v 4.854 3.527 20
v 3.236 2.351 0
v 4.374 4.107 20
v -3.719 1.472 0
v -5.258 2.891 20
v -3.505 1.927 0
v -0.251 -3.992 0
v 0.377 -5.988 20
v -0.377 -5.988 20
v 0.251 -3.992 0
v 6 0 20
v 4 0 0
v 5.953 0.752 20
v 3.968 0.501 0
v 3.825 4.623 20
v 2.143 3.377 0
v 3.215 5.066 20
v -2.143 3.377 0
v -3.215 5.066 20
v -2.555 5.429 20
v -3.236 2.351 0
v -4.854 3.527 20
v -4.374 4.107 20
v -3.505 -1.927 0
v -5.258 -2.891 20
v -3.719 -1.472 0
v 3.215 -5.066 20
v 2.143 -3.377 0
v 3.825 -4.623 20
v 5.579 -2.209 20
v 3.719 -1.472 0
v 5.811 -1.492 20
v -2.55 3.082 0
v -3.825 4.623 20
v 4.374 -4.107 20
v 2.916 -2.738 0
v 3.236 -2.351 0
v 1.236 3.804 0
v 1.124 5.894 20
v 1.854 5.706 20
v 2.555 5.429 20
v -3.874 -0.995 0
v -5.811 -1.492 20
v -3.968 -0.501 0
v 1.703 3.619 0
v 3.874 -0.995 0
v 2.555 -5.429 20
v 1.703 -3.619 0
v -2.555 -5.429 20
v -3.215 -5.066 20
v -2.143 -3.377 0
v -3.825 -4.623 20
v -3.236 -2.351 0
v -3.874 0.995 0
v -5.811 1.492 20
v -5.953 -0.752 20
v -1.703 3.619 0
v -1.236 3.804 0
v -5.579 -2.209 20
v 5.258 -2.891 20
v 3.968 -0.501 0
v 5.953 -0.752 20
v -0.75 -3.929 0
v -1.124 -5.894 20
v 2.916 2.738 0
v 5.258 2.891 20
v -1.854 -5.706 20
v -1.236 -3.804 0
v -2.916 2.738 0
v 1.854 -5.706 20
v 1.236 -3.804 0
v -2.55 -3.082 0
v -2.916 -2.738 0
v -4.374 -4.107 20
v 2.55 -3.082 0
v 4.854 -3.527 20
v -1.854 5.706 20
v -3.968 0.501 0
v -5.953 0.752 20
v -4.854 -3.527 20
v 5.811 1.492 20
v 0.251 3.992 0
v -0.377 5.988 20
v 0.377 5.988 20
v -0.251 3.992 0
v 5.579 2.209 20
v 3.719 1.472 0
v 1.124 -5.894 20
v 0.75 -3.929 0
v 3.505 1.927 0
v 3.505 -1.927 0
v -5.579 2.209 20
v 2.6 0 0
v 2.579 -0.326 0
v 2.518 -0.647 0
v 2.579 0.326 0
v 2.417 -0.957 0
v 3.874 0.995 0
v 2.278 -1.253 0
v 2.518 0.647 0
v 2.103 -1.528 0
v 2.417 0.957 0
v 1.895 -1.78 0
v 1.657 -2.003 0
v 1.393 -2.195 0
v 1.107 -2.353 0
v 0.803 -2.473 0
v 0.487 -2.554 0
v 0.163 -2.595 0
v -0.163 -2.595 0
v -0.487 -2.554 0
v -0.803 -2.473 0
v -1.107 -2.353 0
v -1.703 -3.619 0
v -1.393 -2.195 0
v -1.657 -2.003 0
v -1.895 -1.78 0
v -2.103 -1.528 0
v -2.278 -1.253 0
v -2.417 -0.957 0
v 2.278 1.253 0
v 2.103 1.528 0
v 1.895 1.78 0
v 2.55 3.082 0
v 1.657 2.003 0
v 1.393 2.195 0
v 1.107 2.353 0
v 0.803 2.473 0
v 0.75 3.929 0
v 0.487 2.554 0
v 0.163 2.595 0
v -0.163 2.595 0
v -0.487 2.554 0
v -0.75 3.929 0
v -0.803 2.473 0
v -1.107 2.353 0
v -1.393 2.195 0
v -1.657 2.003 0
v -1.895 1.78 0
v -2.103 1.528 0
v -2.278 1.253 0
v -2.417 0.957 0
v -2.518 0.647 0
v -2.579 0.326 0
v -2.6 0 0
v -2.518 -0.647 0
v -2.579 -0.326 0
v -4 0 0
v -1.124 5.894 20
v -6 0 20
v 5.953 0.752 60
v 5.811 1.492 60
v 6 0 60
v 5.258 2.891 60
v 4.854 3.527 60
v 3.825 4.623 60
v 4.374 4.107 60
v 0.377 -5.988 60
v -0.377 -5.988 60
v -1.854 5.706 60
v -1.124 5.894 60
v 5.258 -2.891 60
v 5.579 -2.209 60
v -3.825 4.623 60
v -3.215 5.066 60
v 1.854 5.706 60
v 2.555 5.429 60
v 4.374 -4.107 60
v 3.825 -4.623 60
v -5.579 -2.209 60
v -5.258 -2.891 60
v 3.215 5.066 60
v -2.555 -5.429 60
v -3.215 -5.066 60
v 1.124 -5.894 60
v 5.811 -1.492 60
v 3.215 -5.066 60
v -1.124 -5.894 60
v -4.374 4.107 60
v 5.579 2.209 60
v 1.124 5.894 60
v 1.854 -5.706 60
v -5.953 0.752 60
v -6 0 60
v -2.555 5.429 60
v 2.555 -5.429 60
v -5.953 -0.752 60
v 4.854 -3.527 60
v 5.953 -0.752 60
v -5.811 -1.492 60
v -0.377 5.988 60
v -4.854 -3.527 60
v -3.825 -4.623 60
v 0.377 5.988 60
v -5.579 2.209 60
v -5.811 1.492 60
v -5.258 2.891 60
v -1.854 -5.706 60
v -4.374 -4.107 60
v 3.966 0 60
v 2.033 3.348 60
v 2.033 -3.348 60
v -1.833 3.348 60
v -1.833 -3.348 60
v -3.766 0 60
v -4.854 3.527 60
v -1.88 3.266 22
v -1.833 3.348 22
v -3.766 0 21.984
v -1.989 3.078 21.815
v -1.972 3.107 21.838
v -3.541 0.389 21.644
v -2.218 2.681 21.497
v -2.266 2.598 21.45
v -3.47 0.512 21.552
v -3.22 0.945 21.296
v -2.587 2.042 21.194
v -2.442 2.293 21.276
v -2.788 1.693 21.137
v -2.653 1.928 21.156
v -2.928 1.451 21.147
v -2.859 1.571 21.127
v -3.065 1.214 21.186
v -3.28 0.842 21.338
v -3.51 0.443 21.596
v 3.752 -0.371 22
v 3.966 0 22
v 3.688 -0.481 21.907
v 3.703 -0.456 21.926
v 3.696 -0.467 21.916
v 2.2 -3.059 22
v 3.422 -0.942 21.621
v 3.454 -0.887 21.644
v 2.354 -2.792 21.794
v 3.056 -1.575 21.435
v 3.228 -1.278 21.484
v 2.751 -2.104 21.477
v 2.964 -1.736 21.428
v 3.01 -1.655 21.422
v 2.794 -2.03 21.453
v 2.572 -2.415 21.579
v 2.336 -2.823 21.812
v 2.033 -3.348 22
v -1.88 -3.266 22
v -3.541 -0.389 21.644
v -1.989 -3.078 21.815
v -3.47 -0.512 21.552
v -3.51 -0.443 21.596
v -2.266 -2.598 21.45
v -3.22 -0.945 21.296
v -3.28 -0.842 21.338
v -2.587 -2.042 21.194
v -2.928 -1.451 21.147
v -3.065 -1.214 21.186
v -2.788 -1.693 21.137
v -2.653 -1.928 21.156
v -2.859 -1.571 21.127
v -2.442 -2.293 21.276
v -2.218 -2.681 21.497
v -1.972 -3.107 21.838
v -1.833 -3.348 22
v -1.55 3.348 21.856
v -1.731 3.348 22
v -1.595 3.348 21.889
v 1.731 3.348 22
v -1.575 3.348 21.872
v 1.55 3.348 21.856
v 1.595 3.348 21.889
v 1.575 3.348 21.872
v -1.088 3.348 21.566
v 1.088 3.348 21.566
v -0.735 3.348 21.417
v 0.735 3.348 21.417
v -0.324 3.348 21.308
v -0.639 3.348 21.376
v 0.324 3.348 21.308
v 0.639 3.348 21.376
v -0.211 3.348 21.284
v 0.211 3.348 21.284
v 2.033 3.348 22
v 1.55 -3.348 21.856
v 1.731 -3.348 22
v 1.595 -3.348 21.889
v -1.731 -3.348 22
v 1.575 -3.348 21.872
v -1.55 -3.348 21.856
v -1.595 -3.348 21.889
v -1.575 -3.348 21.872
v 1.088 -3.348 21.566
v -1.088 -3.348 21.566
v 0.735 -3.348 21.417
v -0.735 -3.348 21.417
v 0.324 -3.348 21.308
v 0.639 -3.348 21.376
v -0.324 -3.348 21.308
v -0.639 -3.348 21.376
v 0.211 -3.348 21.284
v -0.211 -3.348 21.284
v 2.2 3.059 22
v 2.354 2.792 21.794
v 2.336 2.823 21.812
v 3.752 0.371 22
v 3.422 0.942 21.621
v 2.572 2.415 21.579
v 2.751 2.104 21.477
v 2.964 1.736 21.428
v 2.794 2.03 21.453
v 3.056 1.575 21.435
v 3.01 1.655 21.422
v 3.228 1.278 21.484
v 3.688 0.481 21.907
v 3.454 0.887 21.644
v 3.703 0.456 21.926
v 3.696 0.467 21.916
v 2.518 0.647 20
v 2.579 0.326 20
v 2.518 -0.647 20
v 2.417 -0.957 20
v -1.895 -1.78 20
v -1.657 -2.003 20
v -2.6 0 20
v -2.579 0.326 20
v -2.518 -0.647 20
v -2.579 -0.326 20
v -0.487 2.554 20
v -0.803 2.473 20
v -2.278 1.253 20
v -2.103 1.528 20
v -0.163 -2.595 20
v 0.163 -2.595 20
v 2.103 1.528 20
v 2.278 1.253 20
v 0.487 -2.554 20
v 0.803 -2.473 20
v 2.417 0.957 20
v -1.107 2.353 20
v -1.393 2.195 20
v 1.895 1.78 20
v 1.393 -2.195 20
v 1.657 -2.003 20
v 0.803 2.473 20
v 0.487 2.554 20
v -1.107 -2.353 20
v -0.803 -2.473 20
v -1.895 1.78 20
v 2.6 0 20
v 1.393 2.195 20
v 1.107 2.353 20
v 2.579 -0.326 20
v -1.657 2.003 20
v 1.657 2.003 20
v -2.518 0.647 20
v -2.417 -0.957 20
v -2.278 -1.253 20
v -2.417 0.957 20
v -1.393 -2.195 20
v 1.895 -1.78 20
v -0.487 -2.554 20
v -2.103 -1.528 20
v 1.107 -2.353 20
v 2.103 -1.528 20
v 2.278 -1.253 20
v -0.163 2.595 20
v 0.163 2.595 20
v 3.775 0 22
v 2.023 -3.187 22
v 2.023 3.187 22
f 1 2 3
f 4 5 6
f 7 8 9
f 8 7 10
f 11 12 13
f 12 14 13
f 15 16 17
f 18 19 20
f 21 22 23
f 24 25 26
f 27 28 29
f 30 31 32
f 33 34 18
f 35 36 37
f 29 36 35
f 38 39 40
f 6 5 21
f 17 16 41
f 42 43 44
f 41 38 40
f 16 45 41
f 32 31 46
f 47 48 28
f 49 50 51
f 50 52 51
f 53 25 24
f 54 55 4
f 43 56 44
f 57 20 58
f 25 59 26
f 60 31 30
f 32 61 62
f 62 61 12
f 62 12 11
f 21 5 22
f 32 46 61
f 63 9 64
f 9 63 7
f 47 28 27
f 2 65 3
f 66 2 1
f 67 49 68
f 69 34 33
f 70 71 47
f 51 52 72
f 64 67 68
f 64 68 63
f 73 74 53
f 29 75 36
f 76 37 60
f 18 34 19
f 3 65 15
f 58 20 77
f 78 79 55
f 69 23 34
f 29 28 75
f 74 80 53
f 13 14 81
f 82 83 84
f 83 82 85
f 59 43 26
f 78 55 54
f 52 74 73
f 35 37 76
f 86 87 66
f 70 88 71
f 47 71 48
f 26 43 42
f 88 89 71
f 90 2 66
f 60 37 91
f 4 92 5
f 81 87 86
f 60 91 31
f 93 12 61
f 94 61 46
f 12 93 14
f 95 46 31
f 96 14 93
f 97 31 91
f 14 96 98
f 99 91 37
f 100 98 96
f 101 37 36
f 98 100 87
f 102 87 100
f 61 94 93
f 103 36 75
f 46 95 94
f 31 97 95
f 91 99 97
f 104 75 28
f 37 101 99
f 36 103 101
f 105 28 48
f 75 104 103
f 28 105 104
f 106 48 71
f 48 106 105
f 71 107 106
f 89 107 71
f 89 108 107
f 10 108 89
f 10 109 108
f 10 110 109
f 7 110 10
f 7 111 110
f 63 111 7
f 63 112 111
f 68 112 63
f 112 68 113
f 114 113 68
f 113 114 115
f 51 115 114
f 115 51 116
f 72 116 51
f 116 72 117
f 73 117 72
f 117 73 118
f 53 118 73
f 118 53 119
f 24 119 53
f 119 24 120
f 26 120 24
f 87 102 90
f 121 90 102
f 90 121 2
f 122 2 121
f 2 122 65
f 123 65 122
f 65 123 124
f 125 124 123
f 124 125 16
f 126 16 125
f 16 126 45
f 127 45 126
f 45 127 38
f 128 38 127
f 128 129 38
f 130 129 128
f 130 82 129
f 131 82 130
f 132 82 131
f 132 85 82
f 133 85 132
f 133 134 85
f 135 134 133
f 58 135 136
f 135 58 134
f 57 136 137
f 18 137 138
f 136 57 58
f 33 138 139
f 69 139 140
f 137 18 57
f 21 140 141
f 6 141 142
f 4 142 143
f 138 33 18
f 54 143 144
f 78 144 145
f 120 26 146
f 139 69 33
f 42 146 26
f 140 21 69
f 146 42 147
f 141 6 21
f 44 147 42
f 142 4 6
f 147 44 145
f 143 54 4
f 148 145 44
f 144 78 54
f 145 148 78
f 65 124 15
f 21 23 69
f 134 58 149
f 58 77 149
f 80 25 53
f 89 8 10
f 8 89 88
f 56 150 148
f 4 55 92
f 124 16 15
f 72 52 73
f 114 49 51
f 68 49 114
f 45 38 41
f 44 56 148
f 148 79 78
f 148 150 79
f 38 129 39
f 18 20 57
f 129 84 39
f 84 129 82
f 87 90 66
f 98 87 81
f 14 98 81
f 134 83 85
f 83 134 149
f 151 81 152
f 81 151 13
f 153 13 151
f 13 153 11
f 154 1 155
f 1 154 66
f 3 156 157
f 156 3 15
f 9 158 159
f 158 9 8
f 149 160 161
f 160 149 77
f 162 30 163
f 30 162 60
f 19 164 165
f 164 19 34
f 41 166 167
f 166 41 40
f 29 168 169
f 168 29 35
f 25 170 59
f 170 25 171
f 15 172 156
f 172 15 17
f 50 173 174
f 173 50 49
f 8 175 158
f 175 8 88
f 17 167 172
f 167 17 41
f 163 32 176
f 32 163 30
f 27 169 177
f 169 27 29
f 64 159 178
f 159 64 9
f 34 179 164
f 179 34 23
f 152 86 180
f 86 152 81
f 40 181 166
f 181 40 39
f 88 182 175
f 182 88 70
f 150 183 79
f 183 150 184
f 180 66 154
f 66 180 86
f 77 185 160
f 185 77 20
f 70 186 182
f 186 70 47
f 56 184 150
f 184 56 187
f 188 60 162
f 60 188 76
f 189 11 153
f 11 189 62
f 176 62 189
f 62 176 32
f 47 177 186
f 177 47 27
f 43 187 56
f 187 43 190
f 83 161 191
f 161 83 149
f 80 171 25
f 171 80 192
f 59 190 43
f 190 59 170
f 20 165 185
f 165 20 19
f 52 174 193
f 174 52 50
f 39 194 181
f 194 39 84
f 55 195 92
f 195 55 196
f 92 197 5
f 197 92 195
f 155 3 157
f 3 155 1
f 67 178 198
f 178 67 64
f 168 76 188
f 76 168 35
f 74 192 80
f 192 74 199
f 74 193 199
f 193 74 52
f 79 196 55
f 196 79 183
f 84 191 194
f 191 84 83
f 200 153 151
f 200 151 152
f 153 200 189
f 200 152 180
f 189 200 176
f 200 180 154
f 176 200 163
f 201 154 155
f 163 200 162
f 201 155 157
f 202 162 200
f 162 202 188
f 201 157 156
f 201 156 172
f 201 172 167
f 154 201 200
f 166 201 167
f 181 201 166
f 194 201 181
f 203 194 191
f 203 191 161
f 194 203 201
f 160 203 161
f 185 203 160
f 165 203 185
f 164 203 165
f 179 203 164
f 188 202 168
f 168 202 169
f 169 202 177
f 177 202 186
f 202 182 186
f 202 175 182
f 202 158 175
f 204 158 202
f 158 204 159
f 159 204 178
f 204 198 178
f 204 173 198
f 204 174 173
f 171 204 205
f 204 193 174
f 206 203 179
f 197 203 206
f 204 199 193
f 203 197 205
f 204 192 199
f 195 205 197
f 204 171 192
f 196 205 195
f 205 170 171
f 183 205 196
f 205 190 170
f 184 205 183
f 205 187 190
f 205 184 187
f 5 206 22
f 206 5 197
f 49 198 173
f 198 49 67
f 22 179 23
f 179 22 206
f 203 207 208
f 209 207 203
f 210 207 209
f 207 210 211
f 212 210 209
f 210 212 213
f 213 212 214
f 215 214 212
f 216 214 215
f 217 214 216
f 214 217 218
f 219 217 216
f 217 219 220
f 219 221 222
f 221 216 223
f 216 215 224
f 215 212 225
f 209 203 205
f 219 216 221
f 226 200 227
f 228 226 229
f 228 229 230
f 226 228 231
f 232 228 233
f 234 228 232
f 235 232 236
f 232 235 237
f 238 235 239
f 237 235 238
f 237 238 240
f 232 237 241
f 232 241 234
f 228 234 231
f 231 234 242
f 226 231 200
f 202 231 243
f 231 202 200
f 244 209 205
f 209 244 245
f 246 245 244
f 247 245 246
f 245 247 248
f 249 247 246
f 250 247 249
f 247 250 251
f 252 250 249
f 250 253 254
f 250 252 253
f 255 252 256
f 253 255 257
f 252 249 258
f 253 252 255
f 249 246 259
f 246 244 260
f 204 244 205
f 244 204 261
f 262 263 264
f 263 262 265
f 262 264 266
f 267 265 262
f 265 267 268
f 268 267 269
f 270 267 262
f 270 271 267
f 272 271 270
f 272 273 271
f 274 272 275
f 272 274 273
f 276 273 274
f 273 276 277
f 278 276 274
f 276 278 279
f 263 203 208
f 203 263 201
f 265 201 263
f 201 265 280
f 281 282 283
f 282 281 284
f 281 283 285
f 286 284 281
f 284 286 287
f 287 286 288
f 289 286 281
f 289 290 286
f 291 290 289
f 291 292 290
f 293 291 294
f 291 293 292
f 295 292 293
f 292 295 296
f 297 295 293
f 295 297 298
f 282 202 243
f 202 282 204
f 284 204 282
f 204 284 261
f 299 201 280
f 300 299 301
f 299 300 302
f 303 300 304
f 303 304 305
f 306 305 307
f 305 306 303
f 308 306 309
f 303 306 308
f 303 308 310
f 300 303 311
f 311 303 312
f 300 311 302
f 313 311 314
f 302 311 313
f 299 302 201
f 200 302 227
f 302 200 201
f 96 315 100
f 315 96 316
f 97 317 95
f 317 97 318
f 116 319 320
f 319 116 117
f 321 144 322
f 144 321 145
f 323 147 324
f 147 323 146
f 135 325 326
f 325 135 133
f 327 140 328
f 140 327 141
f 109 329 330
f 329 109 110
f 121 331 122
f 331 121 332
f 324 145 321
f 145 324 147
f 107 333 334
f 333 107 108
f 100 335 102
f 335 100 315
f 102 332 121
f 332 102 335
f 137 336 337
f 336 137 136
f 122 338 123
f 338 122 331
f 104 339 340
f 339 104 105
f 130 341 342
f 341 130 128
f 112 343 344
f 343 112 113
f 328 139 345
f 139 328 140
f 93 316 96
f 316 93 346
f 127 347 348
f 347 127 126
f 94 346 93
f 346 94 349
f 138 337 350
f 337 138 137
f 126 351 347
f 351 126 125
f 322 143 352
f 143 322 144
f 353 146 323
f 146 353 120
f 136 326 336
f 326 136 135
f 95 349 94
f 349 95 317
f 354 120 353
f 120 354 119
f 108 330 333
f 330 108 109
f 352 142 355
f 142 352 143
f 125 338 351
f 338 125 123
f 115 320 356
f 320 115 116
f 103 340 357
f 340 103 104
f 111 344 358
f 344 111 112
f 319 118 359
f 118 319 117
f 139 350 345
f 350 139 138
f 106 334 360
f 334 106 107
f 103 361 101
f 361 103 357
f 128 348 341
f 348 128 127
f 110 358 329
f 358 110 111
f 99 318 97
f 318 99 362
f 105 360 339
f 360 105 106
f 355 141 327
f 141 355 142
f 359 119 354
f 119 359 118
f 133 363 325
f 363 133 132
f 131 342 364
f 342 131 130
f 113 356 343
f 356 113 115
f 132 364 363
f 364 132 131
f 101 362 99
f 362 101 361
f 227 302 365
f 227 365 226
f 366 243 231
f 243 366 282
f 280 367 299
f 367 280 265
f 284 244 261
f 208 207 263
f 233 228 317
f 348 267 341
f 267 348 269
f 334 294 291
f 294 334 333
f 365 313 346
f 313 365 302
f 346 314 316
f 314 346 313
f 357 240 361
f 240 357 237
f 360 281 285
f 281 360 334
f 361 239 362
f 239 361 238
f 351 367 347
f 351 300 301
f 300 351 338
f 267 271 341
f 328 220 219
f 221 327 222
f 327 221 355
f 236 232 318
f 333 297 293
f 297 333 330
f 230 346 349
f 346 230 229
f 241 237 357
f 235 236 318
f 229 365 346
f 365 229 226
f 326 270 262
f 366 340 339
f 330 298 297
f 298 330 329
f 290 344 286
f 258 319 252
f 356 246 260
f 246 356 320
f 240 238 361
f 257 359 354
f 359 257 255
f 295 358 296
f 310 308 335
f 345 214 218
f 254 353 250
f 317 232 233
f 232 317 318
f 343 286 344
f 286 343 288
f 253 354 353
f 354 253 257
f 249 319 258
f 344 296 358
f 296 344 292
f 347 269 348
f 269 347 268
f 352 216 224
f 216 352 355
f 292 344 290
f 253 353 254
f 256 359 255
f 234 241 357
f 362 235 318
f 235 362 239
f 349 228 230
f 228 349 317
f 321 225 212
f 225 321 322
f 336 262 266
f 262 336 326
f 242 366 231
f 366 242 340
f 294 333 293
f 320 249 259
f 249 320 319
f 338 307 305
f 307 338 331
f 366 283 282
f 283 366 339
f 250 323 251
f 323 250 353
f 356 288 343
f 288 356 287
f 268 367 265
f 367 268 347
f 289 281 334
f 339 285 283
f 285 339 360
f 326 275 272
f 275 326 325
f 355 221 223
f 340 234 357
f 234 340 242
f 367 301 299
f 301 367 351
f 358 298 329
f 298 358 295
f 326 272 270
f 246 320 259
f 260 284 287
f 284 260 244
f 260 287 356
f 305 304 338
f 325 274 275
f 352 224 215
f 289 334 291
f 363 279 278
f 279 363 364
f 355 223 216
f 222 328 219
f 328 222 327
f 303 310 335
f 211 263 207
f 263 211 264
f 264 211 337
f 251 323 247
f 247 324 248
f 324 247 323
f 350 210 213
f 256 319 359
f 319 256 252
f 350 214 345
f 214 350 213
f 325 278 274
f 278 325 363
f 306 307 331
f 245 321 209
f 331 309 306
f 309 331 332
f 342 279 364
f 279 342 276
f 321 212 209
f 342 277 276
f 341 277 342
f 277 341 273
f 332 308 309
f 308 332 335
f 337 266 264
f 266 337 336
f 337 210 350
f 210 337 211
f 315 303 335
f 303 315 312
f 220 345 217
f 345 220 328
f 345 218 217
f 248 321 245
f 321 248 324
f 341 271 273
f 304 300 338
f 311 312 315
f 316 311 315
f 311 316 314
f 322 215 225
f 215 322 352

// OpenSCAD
$fn = 50;


difference() {
	union() {
		cylinder(h = 20, r1 = 4, r2 = 6.0000000000);
		translate(v = [0, 0, 20.0000000000]) {
			cylinder(h = 40, r = 6.0000000000);
		}
	}
	union() {
		translate(v = [0, 0, 10]) {
			rotate(a = [0, 0, 0]) {
				difference() {
					union() {
						translate(v = [0.1000000000, 0, 10]) {
							#linear_extrude(height = 228.2000000000) {
								polygon(points = [[3.8658550000, 0.0000000000], [1.9329275000, 3.3479286373], [-1.9329275000, 3.3479286373], [-3.8658550000, 0.0000000000], [-1.9329275000, -3.3479286373], [1.9329275000, -3.3479286373]]);
							}
						}
						#translate(v = [0, 0, -61.8000000000]) {
							cylinder(h = 100, r = 2.6000000000);
						}
					}
					union() {
						translate(v = [0, 0, 10]) {
							difference() {
								#cylinder(h = 2, r1 = 10.6000000000, r2 = 11.7750000000);
								#cylinder(h = 2, r1 = 2.6000000000, r2 = 3.7750000000);
							}
						}
					}
				}
			}
		}
	}
}
